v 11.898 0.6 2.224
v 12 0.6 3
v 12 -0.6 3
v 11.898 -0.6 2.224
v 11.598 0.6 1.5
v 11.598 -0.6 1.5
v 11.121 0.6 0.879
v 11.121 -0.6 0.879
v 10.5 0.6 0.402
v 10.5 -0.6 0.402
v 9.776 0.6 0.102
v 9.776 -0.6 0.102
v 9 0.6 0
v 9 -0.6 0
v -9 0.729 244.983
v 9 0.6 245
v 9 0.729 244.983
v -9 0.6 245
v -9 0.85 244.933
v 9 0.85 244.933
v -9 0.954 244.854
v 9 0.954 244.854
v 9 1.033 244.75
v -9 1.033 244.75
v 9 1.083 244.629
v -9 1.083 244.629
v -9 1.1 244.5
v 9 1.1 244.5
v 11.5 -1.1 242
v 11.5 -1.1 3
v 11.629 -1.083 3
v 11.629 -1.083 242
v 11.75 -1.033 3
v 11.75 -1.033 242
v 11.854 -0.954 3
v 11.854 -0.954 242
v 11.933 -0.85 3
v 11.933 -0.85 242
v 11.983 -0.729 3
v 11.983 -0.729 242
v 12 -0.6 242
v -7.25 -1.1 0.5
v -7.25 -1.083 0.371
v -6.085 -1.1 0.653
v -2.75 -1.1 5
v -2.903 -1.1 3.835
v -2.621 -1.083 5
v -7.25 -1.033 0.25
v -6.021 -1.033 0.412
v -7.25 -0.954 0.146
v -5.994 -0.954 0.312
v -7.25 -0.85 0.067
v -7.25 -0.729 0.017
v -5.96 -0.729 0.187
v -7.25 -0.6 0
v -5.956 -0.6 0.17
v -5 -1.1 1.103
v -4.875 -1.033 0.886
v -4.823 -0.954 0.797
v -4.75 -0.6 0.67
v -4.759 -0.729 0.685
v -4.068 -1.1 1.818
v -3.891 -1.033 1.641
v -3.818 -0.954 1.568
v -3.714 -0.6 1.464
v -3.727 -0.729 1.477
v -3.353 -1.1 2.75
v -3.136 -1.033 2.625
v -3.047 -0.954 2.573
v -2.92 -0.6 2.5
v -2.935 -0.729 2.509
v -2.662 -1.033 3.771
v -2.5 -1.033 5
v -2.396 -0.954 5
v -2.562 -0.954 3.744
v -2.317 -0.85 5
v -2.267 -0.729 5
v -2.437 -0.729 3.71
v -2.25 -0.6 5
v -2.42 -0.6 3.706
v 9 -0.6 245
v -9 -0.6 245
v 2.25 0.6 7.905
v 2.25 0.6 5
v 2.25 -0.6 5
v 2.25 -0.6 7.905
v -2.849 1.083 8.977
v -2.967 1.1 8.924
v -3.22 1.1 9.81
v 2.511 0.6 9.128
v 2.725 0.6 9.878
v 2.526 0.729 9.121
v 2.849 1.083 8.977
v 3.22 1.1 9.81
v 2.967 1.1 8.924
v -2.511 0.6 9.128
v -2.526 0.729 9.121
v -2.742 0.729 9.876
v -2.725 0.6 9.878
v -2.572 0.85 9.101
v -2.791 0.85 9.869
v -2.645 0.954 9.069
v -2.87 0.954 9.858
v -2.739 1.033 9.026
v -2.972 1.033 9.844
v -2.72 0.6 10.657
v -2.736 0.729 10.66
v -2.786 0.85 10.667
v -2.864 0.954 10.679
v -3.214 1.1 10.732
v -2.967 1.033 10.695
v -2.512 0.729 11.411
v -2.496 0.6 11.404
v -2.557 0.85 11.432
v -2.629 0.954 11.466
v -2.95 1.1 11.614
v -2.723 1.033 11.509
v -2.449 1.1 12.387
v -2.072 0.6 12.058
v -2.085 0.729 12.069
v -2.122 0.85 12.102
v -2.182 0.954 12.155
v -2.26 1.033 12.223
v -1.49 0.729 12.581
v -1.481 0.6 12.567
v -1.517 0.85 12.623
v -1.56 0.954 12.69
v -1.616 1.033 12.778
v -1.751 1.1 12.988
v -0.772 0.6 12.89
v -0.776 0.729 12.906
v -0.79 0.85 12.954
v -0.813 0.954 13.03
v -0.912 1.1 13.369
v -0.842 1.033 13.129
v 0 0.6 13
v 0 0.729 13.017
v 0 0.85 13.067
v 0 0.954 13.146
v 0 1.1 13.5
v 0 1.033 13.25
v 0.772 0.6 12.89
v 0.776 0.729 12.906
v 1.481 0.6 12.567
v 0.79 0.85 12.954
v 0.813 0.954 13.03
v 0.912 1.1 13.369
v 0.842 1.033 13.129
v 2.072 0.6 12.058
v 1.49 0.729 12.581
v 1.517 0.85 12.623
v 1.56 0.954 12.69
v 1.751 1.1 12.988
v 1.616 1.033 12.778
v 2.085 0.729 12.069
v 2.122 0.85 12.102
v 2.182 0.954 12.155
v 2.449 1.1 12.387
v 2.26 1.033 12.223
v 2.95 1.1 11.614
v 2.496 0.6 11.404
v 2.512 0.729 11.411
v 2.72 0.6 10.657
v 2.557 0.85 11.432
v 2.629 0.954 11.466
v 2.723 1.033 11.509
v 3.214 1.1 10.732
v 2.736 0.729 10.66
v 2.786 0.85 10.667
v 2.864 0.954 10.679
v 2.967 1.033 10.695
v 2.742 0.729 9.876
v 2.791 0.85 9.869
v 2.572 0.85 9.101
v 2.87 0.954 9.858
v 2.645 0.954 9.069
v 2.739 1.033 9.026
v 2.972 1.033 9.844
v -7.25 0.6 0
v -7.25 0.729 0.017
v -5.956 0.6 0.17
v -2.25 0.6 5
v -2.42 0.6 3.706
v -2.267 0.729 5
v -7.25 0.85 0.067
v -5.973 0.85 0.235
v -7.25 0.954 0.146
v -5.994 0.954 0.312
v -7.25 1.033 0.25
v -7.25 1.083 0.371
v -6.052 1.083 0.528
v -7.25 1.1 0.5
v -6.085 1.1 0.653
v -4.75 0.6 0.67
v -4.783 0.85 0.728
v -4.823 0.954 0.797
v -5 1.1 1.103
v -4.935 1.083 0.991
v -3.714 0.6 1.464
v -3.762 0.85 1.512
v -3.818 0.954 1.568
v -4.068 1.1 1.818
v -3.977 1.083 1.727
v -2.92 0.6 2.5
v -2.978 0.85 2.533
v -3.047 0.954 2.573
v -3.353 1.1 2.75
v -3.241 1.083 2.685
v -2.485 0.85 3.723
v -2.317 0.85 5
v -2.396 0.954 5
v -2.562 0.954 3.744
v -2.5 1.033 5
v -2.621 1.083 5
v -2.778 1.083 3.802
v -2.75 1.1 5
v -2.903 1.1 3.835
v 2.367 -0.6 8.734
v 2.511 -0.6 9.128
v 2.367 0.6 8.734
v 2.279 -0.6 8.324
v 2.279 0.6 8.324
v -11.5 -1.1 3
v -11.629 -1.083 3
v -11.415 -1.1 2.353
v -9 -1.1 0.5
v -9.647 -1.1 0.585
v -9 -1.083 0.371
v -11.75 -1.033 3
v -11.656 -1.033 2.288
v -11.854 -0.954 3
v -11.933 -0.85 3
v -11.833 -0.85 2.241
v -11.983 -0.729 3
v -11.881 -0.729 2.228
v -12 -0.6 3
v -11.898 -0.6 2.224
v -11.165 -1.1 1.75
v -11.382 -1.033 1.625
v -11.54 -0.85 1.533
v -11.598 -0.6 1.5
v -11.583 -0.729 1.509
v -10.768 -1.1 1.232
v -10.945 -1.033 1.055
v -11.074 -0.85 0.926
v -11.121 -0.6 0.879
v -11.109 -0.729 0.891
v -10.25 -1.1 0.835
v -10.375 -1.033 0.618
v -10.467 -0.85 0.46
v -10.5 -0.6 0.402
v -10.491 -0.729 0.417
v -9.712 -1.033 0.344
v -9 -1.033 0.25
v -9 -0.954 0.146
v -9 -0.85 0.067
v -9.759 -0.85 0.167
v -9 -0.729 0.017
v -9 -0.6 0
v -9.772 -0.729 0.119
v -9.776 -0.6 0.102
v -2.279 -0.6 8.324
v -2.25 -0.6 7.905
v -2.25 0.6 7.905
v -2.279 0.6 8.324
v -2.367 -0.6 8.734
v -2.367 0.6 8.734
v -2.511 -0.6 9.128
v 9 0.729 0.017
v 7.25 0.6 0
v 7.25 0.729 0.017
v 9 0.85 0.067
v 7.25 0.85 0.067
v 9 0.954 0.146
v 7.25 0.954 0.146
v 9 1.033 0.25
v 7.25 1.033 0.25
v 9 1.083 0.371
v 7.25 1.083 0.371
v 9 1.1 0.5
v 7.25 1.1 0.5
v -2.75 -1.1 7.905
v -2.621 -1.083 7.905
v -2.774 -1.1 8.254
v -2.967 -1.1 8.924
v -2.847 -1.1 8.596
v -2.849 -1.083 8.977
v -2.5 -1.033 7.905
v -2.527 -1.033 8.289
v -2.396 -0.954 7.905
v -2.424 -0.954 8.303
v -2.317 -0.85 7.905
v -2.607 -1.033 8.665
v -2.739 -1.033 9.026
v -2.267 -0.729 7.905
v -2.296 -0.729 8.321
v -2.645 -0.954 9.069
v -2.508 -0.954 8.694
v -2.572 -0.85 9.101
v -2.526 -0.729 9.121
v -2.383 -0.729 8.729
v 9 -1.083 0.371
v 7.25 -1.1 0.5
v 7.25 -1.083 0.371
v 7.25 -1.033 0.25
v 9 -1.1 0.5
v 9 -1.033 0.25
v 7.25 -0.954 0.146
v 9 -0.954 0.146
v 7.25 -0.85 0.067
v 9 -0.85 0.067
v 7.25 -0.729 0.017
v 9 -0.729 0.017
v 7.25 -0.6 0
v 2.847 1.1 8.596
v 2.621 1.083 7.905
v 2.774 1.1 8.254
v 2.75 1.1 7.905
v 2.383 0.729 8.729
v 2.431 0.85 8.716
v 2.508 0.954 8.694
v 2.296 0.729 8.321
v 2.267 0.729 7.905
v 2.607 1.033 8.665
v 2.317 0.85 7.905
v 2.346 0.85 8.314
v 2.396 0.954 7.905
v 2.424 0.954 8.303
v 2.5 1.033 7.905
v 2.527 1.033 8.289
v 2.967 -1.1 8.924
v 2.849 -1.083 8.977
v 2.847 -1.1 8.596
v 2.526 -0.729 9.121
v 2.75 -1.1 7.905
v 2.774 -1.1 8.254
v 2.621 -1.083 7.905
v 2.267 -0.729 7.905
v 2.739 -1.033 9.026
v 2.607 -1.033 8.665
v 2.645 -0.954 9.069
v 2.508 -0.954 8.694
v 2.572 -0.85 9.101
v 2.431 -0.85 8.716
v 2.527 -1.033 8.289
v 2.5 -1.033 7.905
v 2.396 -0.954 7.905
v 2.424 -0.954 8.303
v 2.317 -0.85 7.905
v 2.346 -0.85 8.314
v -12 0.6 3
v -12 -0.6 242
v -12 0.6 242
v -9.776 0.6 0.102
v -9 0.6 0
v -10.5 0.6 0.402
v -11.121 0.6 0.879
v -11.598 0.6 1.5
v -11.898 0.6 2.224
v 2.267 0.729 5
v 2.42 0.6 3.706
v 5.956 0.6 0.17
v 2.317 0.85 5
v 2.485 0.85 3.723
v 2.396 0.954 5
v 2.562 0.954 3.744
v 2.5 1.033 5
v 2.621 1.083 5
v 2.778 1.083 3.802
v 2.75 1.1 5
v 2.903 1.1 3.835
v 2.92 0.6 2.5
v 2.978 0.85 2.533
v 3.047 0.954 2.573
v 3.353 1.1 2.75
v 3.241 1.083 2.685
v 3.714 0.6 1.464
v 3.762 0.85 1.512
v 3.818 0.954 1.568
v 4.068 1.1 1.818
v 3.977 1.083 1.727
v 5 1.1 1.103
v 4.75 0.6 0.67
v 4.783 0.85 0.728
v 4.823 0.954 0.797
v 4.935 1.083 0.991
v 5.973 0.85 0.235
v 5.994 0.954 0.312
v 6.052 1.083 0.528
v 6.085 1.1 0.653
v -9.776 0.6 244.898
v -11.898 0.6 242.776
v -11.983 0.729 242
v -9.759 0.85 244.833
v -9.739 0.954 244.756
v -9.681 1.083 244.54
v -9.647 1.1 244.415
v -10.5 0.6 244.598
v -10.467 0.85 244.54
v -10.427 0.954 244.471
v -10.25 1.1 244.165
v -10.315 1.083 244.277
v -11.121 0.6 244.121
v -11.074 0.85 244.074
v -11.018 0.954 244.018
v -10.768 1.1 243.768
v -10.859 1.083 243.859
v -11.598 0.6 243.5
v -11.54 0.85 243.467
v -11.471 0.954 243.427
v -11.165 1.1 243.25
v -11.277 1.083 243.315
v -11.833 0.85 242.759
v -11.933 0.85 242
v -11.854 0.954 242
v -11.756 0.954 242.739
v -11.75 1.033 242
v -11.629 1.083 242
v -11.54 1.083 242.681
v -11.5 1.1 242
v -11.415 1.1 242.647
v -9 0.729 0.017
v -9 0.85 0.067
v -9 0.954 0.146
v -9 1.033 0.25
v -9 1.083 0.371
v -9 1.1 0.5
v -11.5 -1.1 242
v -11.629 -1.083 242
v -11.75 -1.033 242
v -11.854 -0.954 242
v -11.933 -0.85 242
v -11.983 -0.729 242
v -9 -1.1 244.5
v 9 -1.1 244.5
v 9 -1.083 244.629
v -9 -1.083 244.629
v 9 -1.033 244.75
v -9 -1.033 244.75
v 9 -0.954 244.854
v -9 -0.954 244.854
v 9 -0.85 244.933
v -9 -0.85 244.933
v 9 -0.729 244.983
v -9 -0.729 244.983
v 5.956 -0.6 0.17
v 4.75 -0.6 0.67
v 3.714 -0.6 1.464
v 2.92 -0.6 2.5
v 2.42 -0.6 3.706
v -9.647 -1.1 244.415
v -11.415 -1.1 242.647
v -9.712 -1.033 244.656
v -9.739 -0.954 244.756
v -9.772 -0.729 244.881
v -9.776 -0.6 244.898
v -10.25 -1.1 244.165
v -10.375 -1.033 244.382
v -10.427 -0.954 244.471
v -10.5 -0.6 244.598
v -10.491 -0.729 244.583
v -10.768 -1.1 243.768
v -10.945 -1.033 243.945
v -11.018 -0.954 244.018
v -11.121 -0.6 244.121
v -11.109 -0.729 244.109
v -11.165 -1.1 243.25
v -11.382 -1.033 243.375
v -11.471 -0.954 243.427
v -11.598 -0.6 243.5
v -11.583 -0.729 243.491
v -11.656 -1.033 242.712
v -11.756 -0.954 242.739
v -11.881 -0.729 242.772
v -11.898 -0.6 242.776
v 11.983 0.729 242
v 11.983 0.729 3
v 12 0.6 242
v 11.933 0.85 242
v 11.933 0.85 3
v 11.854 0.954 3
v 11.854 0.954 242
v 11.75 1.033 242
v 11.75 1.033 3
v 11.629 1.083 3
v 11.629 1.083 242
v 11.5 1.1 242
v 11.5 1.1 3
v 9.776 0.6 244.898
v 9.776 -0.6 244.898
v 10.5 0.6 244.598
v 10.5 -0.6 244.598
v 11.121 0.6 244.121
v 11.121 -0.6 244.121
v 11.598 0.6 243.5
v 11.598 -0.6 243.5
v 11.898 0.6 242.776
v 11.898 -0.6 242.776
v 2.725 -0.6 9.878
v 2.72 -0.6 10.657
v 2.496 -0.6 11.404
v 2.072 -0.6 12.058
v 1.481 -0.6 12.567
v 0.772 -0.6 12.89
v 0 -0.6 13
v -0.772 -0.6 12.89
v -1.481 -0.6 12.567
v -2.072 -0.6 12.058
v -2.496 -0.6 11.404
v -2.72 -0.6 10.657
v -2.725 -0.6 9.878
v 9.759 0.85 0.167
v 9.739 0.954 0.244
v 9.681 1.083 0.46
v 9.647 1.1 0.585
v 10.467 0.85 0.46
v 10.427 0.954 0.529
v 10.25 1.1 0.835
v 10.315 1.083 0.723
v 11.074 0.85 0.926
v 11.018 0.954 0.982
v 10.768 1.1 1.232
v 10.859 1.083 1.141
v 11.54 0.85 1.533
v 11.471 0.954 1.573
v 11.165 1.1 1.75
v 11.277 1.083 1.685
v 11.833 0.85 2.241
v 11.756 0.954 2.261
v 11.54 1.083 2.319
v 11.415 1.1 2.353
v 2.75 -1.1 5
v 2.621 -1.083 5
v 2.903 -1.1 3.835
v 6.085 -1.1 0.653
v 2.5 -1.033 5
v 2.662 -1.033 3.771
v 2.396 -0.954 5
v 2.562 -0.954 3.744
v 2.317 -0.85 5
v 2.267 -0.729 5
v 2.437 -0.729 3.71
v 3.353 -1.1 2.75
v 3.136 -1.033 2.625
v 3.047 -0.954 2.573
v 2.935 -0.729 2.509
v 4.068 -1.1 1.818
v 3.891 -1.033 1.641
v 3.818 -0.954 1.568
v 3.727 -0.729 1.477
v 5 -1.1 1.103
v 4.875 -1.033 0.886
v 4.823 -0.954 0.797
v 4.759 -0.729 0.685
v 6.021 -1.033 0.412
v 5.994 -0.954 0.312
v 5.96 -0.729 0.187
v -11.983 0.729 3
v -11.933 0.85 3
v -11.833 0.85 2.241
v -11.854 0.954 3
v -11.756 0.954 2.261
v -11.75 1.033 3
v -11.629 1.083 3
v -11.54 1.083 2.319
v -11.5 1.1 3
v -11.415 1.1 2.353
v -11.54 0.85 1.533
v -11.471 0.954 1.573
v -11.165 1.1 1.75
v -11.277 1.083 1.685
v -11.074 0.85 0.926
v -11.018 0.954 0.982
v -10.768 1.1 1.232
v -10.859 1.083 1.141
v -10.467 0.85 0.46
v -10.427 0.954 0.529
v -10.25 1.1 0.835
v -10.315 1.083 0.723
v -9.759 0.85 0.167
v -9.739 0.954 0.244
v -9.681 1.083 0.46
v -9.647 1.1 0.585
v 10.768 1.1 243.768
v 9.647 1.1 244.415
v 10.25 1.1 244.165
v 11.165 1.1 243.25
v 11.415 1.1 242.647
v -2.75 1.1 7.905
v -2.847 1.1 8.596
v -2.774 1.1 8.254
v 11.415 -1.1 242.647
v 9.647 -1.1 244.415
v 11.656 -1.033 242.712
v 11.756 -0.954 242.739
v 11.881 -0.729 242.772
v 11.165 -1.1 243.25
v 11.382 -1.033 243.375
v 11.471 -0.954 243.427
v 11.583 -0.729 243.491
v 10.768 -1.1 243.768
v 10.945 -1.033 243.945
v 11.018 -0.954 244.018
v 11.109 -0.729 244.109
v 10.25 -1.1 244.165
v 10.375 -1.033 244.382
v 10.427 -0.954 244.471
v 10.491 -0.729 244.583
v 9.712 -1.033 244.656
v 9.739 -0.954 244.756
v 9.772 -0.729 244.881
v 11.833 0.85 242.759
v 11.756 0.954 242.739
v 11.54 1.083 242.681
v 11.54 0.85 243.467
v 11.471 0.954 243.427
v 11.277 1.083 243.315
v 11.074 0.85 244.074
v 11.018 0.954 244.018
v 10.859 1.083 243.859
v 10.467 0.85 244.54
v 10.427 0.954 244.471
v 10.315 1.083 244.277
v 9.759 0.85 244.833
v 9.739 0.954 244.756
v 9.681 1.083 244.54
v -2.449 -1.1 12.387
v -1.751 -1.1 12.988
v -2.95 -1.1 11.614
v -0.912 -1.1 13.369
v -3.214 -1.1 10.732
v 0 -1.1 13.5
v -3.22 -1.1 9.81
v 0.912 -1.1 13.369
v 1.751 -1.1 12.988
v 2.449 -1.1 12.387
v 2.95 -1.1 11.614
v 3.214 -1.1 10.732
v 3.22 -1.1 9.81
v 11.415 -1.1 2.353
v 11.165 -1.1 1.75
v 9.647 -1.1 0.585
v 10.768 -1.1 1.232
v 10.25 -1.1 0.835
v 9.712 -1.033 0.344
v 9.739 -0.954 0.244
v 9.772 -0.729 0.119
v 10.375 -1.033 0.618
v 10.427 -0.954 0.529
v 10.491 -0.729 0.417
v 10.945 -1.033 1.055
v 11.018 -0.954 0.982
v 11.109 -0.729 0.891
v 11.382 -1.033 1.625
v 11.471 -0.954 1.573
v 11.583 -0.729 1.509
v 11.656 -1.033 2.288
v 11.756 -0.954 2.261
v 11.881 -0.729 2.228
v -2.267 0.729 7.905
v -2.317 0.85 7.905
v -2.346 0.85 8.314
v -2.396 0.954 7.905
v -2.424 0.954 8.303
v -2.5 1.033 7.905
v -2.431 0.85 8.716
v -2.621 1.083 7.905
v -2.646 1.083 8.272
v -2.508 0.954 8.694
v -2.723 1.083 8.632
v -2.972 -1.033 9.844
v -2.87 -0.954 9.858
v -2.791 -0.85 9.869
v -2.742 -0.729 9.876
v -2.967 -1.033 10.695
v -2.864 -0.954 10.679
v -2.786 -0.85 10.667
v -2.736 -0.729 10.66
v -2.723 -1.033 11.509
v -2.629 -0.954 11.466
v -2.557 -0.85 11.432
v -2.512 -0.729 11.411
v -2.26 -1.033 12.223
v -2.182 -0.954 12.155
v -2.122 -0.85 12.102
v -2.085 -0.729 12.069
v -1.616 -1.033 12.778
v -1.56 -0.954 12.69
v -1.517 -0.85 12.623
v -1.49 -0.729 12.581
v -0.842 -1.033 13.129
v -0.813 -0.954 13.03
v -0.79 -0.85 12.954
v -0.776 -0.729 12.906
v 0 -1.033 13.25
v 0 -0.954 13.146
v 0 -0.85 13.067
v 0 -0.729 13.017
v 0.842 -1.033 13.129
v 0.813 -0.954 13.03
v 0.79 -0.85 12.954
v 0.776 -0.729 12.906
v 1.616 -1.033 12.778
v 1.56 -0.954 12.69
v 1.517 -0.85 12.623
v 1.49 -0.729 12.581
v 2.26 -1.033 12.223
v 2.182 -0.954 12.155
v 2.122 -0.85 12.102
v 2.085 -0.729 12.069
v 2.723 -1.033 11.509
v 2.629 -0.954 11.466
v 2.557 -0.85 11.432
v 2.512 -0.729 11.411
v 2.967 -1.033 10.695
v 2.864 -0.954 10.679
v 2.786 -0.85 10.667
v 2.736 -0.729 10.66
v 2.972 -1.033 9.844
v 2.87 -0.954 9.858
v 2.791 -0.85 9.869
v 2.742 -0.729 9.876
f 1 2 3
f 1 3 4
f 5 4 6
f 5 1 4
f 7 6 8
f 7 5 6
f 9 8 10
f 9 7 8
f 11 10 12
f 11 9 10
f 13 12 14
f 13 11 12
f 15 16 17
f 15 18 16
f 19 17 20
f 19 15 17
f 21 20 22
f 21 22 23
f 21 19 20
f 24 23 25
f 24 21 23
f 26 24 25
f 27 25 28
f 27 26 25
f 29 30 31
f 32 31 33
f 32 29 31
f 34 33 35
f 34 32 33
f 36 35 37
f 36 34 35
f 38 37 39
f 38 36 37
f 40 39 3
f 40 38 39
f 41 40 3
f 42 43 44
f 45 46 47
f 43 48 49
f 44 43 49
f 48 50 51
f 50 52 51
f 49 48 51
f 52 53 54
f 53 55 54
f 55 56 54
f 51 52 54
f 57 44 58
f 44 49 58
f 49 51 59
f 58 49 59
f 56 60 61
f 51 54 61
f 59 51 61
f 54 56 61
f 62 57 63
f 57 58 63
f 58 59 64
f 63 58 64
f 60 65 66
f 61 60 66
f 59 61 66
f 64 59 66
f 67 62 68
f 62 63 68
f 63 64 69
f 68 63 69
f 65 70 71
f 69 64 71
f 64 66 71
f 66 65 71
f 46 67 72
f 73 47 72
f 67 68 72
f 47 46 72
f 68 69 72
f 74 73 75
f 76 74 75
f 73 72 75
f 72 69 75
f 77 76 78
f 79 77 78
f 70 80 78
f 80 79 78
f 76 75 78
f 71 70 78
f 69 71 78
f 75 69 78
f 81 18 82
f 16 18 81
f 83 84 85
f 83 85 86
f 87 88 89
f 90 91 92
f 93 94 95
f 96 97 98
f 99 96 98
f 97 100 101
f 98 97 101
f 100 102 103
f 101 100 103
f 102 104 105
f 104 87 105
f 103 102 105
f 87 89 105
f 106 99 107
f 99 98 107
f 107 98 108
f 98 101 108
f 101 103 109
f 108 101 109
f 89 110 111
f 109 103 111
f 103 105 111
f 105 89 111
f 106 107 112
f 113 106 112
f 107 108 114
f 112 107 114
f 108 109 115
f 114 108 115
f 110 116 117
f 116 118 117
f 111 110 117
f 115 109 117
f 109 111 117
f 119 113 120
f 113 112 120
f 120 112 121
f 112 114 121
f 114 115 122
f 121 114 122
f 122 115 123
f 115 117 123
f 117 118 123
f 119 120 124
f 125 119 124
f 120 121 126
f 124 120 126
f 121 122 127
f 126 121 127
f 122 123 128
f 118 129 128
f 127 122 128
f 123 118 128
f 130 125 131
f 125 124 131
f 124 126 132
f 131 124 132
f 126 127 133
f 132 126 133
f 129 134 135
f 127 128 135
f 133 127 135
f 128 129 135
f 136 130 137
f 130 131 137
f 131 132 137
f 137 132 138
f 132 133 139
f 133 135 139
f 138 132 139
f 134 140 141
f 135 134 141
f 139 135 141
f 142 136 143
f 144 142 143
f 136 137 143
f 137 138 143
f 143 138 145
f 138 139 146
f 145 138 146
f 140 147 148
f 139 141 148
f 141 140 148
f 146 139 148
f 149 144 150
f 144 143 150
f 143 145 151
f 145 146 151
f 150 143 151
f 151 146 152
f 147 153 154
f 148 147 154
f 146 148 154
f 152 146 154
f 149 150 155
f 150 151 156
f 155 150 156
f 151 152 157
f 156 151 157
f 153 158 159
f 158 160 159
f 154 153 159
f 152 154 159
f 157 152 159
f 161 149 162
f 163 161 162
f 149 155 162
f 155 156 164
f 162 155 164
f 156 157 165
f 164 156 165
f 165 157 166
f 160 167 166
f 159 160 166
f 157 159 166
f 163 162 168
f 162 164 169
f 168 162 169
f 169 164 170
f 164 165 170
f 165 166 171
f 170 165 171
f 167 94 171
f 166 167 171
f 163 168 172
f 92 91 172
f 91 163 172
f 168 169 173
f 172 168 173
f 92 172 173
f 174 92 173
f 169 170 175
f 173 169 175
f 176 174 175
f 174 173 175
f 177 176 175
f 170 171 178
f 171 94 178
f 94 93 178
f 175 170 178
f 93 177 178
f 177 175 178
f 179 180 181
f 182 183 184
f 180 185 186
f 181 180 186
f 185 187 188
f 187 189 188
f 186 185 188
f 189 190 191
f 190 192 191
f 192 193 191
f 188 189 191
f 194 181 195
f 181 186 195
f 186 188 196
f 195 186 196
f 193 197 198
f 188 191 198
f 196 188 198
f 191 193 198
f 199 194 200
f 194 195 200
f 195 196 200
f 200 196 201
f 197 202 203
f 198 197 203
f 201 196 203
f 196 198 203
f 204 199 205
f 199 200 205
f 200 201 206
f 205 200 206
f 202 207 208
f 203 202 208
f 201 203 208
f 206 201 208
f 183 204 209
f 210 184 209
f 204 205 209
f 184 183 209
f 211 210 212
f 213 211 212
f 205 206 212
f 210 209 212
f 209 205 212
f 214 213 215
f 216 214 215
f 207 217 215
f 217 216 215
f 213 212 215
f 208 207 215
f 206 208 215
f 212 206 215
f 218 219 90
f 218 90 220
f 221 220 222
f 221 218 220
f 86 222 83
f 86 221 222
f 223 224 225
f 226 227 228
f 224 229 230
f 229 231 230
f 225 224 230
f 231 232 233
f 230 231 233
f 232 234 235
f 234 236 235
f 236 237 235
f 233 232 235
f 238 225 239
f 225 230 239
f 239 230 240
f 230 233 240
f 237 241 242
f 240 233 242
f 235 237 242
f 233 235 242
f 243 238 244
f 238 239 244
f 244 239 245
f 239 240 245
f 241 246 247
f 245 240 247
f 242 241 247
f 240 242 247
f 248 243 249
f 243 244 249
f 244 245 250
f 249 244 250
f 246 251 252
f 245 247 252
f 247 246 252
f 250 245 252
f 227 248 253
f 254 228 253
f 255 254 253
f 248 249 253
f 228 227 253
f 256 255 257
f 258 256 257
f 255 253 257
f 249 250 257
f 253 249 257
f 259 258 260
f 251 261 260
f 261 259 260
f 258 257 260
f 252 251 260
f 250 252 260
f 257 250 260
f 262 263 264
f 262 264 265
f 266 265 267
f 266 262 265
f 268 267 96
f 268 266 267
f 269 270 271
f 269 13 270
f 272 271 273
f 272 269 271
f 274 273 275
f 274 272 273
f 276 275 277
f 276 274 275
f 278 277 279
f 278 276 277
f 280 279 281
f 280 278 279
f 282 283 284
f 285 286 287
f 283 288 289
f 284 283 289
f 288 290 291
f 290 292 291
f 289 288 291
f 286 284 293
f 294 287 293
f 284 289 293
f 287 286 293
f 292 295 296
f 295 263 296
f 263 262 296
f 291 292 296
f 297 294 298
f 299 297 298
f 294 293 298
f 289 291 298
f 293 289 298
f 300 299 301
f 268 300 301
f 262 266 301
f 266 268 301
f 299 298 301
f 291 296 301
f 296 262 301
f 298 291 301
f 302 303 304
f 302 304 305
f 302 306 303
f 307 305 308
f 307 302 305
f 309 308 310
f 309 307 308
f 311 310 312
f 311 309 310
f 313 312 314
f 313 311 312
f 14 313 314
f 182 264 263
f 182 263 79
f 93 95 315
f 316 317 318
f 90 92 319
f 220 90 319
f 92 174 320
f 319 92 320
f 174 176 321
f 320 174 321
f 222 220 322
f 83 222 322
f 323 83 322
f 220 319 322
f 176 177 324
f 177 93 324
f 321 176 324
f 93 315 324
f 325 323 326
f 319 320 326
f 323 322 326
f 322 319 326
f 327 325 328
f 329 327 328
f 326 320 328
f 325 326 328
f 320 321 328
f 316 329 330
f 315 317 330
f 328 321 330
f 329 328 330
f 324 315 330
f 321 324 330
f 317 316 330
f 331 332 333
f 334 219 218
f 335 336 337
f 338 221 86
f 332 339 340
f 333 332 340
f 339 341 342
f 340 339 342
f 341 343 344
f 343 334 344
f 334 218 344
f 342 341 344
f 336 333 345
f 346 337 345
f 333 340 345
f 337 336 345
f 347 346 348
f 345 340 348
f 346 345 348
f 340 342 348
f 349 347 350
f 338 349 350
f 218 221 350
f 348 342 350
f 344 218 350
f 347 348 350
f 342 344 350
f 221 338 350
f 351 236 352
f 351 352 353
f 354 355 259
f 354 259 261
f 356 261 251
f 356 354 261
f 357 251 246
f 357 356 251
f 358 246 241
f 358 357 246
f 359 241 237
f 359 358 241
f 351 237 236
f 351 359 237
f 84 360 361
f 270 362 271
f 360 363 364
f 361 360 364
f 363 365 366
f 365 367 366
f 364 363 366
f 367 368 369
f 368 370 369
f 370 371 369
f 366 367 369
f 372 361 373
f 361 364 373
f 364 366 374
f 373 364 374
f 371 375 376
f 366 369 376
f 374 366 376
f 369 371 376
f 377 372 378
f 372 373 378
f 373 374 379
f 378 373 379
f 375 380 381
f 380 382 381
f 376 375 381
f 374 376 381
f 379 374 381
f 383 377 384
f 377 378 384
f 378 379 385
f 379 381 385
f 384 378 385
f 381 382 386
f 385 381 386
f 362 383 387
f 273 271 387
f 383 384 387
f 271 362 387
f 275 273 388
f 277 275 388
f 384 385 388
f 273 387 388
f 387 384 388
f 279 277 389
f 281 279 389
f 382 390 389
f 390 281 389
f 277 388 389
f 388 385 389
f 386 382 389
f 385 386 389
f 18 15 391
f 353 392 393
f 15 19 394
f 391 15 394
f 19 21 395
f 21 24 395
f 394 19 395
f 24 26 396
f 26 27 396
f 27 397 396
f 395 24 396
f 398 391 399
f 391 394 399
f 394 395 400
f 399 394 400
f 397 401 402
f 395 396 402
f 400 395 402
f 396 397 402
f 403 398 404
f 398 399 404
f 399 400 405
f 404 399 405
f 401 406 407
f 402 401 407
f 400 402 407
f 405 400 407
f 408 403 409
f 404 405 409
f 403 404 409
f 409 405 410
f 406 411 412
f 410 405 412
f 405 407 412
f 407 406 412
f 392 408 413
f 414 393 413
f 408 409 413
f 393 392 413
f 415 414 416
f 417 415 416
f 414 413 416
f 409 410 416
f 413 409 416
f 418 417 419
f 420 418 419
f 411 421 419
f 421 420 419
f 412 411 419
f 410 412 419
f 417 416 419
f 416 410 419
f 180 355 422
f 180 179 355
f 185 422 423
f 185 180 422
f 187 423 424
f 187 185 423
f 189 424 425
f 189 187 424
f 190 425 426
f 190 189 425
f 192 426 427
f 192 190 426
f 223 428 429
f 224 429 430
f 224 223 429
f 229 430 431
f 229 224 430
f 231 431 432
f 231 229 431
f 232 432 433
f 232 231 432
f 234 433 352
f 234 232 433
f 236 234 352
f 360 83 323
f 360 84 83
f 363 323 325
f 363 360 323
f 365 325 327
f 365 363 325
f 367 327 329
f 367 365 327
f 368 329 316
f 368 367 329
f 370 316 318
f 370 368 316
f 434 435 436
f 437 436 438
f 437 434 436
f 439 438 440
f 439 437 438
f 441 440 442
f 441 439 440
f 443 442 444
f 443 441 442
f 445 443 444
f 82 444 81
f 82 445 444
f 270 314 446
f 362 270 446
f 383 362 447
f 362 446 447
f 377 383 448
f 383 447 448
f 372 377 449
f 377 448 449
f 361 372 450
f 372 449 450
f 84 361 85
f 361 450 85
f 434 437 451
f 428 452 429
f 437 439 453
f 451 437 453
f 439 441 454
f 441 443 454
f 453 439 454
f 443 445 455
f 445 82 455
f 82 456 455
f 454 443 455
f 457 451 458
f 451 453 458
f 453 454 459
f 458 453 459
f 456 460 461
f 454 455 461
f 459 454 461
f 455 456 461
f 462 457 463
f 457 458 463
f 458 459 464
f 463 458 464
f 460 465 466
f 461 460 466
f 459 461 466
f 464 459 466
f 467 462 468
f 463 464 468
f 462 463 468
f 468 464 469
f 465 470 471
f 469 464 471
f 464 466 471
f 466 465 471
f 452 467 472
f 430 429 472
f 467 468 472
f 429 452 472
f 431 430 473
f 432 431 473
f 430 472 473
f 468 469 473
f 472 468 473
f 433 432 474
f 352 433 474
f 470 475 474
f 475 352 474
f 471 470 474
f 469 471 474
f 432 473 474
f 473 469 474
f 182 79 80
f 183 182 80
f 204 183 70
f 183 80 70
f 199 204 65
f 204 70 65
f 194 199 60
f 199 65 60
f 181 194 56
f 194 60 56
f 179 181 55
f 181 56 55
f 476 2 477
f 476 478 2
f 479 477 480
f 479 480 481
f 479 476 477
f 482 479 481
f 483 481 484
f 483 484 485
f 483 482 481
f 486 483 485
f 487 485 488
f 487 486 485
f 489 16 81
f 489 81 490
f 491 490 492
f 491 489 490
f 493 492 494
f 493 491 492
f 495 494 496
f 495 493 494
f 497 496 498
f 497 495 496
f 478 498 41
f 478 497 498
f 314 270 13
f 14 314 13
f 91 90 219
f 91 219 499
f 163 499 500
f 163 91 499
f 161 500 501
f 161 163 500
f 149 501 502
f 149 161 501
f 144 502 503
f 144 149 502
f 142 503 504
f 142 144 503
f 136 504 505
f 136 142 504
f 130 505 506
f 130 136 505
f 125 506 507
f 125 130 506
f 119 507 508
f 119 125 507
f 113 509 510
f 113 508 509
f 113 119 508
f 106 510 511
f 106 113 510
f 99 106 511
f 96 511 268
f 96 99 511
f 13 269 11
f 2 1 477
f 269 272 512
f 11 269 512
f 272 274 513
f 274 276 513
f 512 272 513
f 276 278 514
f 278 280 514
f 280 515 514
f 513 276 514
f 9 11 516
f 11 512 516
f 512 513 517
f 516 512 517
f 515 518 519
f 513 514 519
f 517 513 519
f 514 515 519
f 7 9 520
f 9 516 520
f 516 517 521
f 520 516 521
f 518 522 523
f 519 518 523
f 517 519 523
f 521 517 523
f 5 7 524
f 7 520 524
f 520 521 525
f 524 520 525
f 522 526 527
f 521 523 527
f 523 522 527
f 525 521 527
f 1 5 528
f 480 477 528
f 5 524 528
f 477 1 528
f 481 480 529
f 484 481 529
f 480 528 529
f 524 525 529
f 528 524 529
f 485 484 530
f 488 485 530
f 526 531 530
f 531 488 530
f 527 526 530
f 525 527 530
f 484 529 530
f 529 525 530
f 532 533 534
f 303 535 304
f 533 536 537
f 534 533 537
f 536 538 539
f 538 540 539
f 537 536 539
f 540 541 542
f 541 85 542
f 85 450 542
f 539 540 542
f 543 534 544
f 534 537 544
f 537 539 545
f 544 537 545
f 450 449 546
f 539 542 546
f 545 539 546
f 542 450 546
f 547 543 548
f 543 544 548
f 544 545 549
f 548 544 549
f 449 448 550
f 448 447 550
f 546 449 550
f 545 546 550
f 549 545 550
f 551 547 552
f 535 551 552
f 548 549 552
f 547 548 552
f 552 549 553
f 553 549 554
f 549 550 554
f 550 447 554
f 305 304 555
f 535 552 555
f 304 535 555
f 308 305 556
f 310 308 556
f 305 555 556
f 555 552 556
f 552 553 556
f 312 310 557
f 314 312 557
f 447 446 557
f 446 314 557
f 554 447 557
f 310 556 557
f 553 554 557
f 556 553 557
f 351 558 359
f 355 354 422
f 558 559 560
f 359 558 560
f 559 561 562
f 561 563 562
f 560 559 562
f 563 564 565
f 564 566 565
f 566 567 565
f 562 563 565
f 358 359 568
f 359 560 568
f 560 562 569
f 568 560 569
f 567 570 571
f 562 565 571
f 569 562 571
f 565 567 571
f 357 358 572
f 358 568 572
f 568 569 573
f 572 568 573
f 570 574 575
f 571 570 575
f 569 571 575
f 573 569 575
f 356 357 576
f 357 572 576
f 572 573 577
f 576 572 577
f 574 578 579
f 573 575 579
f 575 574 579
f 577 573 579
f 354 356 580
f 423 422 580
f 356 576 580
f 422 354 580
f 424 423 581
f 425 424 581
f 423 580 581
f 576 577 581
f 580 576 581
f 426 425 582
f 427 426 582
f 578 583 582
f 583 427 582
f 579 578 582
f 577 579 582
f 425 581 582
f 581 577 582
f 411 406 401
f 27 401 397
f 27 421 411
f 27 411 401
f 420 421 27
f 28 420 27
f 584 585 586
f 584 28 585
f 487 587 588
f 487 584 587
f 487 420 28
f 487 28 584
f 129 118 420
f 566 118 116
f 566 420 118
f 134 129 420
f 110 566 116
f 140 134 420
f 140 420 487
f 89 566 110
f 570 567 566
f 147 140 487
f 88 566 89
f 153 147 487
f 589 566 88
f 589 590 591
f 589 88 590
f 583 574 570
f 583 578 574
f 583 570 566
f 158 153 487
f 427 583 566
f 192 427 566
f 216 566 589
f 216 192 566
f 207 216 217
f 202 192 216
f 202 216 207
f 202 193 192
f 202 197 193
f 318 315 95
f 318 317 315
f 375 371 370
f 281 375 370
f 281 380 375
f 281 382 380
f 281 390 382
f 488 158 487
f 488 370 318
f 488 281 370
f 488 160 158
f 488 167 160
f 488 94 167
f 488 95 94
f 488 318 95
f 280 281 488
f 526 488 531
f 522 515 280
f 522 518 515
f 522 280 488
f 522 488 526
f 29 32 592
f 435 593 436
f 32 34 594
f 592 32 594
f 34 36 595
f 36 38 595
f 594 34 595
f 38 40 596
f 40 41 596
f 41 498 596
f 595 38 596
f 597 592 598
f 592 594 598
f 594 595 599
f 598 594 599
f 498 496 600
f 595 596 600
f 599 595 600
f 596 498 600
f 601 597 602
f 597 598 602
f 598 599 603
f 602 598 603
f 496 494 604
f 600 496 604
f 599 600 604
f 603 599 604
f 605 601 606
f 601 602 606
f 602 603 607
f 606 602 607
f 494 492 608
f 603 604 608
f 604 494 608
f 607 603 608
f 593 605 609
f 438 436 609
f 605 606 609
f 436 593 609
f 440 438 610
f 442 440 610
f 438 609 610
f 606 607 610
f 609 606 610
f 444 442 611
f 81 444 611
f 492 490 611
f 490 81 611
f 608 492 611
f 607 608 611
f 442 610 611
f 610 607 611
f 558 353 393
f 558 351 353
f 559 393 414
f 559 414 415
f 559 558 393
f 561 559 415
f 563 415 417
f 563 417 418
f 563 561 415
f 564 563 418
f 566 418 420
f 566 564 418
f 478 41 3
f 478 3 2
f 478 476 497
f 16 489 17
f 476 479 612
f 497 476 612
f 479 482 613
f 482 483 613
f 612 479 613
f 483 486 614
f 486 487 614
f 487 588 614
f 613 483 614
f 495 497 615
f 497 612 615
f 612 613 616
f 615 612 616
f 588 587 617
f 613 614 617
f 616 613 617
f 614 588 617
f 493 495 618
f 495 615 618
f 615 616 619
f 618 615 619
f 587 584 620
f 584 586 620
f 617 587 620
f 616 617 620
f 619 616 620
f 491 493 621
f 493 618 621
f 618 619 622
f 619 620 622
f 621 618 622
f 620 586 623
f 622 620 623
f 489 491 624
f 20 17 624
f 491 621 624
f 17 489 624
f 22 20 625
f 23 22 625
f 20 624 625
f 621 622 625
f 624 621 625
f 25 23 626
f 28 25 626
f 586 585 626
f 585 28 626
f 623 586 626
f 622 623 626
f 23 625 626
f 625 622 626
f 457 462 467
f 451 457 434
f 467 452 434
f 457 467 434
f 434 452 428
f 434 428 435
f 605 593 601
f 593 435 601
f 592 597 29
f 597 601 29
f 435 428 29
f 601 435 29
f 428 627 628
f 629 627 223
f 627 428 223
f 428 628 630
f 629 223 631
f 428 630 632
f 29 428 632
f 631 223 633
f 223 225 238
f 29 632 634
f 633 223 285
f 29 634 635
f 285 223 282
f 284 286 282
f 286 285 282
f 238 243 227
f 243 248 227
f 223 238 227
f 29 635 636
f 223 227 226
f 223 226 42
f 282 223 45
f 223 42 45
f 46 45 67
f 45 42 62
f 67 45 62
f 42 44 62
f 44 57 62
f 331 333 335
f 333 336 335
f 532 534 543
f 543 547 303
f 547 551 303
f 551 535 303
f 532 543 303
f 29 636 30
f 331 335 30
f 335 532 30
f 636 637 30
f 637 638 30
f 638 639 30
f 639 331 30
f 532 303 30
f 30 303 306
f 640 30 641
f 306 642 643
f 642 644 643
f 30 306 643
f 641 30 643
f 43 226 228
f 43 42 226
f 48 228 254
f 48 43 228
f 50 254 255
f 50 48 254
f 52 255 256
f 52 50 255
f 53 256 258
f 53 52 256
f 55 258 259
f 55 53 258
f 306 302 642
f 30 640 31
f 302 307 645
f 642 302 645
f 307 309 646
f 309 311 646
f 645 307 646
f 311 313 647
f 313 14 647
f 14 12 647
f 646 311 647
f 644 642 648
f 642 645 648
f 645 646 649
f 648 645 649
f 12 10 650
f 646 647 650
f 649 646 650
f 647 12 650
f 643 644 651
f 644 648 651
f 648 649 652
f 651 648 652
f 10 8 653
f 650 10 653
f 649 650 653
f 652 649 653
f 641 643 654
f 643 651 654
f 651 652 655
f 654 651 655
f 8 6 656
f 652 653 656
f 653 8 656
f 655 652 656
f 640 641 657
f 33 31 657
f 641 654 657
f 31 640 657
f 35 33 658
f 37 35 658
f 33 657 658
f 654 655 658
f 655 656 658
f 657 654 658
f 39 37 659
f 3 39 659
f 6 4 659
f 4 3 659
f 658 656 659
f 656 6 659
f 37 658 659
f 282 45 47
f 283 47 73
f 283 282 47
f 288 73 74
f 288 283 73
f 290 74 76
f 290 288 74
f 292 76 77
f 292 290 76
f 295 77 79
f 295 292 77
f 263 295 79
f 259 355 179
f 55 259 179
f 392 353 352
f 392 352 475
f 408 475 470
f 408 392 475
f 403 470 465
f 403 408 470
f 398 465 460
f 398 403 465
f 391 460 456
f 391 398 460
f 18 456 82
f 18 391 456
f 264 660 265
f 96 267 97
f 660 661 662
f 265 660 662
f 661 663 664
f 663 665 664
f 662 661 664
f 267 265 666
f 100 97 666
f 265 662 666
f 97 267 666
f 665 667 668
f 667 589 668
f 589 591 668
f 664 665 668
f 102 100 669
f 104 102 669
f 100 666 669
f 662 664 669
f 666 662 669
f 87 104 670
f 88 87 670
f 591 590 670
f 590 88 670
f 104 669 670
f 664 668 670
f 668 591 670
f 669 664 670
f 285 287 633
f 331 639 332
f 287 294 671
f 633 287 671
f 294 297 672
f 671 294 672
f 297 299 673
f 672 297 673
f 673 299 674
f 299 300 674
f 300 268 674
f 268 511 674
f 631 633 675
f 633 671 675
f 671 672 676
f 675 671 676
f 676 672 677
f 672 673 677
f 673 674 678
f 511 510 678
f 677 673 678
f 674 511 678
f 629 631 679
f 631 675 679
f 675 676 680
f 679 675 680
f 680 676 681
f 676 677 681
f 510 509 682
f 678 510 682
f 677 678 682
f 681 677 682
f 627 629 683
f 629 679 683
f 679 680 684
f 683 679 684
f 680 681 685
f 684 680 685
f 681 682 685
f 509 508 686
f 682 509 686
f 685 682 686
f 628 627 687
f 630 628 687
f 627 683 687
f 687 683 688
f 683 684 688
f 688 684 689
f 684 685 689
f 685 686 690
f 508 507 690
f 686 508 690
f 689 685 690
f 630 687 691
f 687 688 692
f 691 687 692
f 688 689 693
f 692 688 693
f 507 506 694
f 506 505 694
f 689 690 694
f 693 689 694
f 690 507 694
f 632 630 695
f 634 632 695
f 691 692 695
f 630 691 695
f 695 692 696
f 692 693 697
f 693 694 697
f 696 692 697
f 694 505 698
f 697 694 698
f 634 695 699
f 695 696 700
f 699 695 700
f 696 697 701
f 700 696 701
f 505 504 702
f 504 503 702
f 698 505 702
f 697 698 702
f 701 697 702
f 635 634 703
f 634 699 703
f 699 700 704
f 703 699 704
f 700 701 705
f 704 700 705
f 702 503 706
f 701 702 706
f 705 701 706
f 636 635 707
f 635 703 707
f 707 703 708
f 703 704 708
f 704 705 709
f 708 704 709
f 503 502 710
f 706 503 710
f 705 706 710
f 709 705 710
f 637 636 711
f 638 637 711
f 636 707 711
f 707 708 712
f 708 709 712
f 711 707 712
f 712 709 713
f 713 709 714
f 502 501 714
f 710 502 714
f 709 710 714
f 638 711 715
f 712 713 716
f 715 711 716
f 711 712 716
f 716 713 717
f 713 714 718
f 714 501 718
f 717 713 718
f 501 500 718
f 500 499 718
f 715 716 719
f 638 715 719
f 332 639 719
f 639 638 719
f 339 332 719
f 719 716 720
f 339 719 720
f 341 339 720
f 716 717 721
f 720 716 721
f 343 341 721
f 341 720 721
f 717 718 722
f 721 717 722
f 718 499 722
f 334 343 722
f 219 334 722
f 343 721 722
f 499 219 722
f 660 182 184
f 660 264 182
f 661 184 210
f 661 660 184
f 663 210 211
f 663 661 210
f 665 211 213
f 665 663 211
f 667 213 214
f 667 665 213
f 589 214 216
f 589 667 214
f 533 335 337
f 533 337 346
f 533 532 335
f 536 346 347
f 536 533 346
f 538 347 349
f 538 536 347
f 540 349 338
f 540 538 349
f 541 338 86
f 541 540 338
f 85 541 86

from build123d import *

# Parameters (mm, degrees)
F0_W          = 24
F0_H          = 2.2
F1_DEPTH      = 245
F3_DEPTH      = 1.101
F3_DEPTH_BACK = 1.101
F4_R          = 5
F5_R          = 3
F6_R          = 3
F7_R          = 0.5


with BuildPart() as f1:
    # F0 (on Top) → F1 (new body)
    with BuildSketch(Plane.XY):
        Rectangle(F0_W, F0_H)
    extrude(amount=F1_DEPTH)

    # F2 (on Front) → F3 (cut, two sides)
    with BuildSketch(Plane.XZ) as f3_sk:
        with BuildLine():
            Line((2.25, 0), (2.25, 8.6688611699))
            ThreePointArc((2.25, 8.6688611699), (0, 13), (-2.25, 8.6688611699))
            Line((-2.25, 8.6688611699), (-2.25, 0))
            Line((-2.25, 0), (2.25, 0))
        make_face()
    extrude(amount=-F3_DEPTH, mode=Mode.SUBTRACT)
    extrude(f3_sk.sketch, amount=F3_DEPTH_BACK, mode=Mode.SUBTRACT)

    # F4
    f4_edges = [f1.edges().sort_by_distance(p)[0] for p in [
        (2.25, 0, 0),
        (-2.25, 0, 0),
    ]]
    fillet(f4_edges, radius=F4_R)

    # F5
    f5_edges = [f1.edges().sort_by_distance(p)[0] for p in [
        (-2.25, 0, 8.668861),
        (2.25, 0, 8.668861),
    ]]
    fillet(f5_edges, radius=F5_R)

    # F6
    f6_edges = [f1.edges().sort_by_distance(p)[0] for p in [
        (12, 0, 245),
        (-12, 0, 245),
        (-12, 0, 0),
        (12, 0, 0),
    ]]
    fillet(f6_edges, radius=F6_R)

    # F7
    f7_edges = [f1.edges().sort_by_distance(p)[0] for p in [
        (-8.125, -1.1, 0),
        (-11.12132, -1.1, 0.87868),
        (-3.714466, -1.1, 1.464466),
        (-12, -1.1, 122.5),
        (-2.25, -1.1, 6.452396),
        (-11.12132, -1.1, 244.12132),
        (-2.315942, -1.1, 8.530335),
        (0, -1.1, 245),
        (0, -1.1, 13),
        (11.12132, -1.1, 244.12132),
        (2.315942, -1.1, 8.530335),
        (12, -1.1, 122.5),
        (2.25, -1.1, 6.452396),
        (11.12132, -1.1, 0.87868),
        (3.714466, -1.1, 1.464466),
        (8.125, -1.1, 0),
        (-8.125, 1.1, 0),
        (-11.12132, 1.1, 0.87868),
        (-3.714466, 1.1, 1.464466),
        (-12, 1.1, 122.5),
        (-2.25, 1.1, 6.452396),
        (-11.12132, 1.1, 244.12132),
        (-2.315942, 1.1, 8.530335),
        (0, 1.1, 245),
        (0, 1.1, 13),
        (11.12132, 1.1, 244.12132),
        (2.315942, 1.1, 8.530335),
        (12, 1.1, 122.5),
        (2.25, 1.1, 6.452396),
        (11.12132, 1.1, 0.87868),
        (3.714466, 1.1, 1.464466),
        (8.125, 1.1, 0),
    ]]
    fillet(f7_edges, radius=F7_R)


solid = f1.part
